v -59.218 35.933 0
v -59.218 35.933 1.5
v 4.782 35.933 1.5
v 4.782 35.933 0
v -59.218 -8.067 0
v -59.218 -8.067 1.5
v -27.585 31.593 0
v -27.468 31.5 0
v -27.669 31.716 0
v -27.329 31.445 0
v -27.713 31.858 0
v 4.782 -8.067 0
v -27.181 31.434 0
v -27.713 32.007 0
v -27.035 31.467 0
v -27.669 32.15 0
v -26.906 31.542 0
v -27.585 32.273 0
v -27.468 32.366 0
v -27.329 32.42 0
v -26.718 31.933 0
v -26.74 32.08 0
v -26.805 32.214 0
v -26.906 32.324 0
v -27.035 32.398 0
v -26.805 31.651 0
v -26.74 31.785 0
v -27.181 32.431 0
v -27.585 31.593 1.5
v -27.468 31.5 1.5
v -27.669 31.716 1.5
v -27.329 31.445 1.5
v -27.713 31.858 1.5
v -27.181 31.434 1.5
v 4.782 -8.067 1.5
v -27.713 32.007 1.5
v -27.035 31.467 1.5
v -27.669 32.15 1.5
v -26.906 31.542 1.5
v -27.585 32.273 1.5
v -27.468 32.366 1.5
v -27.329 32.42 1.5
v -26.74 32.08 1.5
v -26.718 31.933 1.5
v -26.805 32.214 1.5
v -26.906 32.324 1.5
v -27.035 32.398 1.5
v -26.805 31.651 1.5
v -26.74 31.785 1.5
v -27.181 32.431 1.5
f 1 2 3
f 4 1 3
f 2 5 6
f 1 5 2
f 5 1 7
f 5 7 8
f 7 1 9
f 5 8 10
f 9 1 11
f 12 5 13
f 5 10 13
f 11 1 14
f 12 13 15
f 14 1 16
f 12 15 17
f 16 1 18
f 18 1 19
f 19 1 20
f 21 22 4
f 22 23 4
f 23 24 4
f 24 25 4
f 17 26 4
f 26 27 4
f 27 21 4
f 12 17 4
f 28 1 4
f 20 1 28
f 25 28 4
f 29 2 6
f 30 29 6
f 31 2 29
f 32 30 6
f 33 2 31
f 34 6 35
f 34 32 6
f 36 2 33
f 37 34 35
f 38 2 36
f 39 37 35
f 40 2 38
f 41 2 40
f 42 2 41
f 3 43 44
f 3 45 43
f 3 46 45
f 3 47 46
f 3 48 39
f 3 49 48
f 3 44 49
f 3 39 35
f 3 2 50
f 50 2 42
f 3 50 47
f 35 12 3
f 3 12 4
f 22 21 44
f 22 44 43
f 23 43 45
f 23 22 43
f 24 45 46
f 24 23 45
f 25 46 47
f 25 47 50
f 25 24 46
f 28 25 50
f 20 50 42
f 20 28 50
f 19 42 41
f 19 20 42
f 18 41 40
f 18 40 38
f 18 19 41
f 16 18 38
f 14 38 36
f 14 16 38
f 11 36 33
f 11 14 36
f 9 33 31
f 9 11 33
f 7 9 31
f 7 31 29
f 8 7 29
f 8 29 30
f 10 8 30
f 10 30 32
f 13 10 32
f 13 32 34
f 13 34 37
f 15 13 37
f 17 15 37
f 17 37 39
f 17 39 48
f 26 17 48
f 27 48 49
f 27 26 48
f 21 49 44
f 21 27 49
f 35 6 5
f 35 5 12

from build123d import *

# Parameters (mm, degrees)
SKETCH_1_W          = 64
SKETCH_1_H          = 50
SKETCH_1_R          = 0.5
EXTRUDE_1_DEPTH     = 1.5
SKETCH_2_W          = 64
SKETCH_2_H          = 3
CUT_EXTRUDE_1_DEPTH = 1.5


with BuildPart() as part:
    # 草图1 → 凸台-拉伸1 (new body)
    with BuildSketch(Plane.XY):
        with Locations((-27.218154809, 13.932786885)):
            Rectangle(SKETCH_1_W, SKETCH_1_H)
        with Locations((-27.218154809, 31.932786885)):
            Circle(SKETCH_1_R, mode=Mode.SUBTRACT)
    extrude(amount=EXTRUDE_1_DEPTH)

    # 草图2 → 切除-拉伸1 (cut)
    with BuildSketch(Plane.XY.offset(1.5)):
        with Locations((-27.218154809, -9.567213115)):
            Rectangle(SKETCH_2_W, SKETCH_2_H)
        with Locations((-27.218154809, 37.432786885)):
            Rectangle(SKETCH_2_W, SKETCH_2_H)
    extrude(amount=-CUT_EXTRUDE_1_DEPTH, mode=Mode.SUBTRACT)


solid = part.part
